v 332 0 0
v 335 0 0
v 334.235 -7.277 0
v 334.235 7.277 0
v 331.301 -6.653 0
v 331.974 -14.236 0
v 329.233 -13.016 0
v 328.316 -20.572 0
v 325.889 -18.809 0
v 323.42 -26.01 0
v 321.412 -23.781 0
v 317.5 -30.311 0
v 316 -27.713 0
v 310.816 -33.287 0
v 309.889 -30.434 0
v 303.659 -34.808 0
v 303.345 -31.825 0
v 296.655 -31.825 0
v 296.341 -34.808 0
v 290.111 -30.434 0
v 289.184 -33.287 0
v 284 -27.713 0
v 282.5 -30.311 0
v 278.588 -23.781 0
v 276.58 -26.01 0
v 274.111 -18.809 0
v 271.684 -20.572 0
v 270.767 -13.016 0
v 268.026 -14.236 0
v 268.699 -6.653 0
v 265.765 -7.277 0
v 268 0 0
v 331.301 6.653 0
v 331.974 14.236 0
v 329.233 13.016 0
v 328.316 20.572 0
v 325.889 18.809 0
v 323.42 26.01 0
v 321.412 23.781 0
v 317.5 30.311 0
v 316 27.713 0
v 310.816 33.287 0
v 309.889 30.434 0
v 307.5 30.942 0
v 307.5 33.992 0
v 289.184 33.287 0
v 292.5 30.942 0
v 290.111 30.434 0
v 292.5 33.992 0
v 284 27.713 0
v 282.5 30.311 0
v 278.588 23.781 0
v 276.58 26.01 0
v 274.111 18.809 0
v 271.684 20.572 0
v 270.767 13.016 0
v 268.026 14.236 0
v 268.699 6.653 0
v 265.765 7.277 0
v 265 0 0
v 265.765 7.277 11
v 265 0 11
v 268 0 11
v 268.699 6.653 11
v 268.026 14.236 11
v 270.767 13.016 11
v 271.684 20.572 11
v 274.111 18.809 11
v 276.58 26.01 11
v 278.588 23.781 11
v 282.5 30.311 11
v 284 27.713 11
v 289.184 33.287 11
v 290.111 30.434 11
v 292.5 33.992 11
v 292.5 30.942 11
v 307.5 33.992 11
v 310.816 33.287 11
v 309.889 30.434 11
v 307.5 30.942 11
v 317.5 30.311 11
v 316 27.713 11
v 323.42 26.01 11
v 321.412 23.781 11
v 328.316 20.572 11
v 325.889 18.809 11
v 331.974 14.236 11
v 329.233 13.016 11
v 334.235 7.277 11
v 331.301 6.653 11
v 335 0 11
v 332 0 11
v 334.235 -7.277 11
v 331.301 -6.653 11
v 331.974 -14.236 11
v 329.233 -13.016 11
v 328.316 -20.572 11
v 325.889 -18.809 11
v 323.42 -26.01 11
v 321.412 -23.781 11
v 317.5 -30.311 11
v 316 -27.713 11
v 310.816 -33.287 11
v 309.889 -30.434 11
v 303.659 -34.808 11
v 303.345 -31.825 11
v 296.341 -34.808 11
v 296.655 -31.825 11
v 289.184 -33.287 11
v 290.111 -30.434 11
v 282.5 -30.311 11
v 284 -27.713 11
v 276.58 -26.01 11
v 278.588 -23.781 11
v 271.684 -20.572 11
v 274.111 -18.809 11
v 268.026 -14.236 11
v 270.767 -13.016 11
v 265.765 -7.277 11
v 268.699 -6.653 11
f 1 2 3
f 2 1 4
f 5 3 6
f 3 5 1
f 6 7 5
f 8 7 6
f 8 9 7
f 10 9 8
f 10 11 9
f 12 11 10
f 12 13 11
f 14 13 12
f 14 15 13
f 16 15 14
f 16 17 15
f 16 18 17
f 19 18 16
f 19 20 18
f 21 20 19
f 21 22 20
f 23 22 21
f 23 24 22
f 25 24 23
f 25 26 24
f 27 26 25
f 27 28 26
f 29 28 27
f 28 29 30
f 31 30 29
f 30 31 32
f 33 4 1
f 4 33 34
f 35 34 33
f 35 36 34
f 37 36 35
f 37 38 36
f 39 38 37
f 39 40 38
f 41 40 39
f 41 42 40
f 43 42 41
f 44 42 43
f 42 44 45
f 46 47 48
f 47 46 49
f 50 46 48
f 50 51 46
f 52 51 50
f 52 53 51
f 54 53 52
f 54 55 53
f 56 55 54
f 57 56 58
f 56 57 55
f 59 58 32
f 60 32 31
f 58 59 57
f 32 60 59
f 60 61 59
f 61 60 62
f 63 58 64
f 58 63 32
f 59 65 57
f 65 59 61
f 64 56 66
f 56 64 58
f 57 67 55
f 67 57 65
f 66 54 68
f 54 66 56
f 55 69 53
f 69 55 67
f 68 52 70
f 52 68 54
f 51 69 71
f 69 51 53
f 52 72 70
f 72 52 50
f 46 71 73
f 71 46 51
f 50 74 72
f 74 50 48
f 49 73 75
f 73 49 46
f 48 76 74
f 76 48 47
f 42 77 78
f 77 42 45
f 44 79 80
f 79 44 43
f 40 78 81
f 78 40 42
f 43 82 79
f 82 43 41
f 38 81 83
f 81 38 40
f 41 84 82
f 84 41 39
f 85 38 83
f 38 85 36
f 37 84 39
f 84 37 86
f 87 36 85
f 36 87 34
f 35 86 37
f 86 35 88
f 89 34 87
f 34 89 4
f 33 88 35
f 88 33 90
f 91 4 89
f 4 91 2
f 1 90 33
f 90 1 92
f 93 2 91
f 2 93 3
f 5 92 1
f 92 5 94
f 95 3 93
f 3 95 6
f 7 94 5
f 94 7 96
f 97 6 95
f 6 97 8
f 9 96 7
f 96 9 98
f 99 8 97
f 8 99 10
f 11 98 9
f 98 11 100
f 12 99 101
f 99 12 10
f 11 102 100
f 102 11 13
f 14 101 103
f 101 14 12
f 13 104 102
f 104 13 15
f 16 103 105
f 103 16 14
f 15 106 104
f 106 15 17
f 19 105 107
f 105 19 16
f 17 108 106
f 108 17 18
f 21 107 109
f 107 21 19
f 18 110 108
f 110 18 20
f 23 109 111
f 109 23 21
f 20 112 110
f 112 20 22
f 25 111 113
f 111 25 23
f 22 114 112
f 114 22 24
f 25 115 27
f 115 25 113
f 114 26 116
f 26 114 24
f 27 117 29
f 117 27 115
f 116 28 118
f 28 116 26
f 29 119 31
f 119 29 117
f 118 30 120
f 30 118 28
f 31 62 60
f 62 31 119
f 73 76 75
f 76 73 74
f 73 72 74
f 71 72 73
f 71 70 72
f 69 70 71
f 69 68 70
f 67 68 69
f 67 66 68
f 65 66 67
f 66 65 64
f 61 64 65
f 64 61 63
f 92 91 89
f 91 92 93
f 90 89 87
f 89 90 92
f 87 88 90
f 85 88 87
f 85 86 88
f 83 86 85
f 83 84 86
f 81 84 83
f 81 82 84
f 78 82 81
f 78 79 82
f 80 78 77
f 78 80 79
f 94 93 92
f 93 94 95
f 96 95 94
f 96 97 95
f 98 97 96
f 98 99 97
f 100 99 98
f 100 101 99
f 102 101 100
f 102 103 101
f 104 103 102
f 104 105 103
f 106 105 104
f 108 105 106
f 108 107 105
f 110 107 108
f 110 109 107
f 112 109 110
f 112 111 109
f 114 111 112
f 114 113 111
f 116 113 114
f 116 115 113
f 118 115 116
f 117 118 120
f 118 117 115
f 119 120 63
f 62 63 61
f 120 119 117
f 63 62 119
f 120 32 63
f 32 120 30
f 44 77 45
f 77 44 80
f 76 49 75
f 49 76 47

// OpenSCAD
// Tea pot lid
// © 2017 Roland Sieker <ospalh@gmail.com> 
// Licence: CC-BY-SA 4.0

////////////////////////////////////////////
// Maker config section

// From the teapot. Radius of the neck where the lid will rest, in millimeters.
teapot_inner_radius = 35;
// And i mean radius. When you measure the diameter (with a caliper), divide by two.

// How you like it
brim_hight = 11;  // hight of the lange/brim
thickness = 3;  // general material thickness
sprout_width = 15;  // How wide the gap for the spourt is 
handle_radus = 5;

use_standard_handle = true;
// Set to false and add your own ornament as handle in the next step (slic3r, …) if you like.

// How your printing works. The higher, the higher and uglier (in some sense) the lid. Too low, and you get whiskers/drooping
overhang_angle = 35;

///////////////////////////////////
// End config section


// Main
{
   translate([300, 0, 0])
   {
      brim();
   }
   
   ir = teapot_inner_radius;  // To avoid cobol fingers
   t = thickness;
   polygon();
}

module brim()
{
   difference()
   {
      // The real brim:
      rotate_extrude()
      // I wanted to use the angle argument here, but my OpenSCAD’s too old.
      {
         translate([teapot_inner_radius-thickness, 0, 0])
         {
            square([thickness, brim_hight]);
         }
      }

      // The gap
      translate([-0.5*sprout_width, 0.5*teapot_inner_radius, -0.5*brim_hight])
      {
         cube([sprout_width, teapot_inner_radius, 2*brim_hight], false);
      }
   }
}

module hat_ring()

module hat_funnel()
{
   
}

module grip_base()
{
}

module grip()
{
   
}
